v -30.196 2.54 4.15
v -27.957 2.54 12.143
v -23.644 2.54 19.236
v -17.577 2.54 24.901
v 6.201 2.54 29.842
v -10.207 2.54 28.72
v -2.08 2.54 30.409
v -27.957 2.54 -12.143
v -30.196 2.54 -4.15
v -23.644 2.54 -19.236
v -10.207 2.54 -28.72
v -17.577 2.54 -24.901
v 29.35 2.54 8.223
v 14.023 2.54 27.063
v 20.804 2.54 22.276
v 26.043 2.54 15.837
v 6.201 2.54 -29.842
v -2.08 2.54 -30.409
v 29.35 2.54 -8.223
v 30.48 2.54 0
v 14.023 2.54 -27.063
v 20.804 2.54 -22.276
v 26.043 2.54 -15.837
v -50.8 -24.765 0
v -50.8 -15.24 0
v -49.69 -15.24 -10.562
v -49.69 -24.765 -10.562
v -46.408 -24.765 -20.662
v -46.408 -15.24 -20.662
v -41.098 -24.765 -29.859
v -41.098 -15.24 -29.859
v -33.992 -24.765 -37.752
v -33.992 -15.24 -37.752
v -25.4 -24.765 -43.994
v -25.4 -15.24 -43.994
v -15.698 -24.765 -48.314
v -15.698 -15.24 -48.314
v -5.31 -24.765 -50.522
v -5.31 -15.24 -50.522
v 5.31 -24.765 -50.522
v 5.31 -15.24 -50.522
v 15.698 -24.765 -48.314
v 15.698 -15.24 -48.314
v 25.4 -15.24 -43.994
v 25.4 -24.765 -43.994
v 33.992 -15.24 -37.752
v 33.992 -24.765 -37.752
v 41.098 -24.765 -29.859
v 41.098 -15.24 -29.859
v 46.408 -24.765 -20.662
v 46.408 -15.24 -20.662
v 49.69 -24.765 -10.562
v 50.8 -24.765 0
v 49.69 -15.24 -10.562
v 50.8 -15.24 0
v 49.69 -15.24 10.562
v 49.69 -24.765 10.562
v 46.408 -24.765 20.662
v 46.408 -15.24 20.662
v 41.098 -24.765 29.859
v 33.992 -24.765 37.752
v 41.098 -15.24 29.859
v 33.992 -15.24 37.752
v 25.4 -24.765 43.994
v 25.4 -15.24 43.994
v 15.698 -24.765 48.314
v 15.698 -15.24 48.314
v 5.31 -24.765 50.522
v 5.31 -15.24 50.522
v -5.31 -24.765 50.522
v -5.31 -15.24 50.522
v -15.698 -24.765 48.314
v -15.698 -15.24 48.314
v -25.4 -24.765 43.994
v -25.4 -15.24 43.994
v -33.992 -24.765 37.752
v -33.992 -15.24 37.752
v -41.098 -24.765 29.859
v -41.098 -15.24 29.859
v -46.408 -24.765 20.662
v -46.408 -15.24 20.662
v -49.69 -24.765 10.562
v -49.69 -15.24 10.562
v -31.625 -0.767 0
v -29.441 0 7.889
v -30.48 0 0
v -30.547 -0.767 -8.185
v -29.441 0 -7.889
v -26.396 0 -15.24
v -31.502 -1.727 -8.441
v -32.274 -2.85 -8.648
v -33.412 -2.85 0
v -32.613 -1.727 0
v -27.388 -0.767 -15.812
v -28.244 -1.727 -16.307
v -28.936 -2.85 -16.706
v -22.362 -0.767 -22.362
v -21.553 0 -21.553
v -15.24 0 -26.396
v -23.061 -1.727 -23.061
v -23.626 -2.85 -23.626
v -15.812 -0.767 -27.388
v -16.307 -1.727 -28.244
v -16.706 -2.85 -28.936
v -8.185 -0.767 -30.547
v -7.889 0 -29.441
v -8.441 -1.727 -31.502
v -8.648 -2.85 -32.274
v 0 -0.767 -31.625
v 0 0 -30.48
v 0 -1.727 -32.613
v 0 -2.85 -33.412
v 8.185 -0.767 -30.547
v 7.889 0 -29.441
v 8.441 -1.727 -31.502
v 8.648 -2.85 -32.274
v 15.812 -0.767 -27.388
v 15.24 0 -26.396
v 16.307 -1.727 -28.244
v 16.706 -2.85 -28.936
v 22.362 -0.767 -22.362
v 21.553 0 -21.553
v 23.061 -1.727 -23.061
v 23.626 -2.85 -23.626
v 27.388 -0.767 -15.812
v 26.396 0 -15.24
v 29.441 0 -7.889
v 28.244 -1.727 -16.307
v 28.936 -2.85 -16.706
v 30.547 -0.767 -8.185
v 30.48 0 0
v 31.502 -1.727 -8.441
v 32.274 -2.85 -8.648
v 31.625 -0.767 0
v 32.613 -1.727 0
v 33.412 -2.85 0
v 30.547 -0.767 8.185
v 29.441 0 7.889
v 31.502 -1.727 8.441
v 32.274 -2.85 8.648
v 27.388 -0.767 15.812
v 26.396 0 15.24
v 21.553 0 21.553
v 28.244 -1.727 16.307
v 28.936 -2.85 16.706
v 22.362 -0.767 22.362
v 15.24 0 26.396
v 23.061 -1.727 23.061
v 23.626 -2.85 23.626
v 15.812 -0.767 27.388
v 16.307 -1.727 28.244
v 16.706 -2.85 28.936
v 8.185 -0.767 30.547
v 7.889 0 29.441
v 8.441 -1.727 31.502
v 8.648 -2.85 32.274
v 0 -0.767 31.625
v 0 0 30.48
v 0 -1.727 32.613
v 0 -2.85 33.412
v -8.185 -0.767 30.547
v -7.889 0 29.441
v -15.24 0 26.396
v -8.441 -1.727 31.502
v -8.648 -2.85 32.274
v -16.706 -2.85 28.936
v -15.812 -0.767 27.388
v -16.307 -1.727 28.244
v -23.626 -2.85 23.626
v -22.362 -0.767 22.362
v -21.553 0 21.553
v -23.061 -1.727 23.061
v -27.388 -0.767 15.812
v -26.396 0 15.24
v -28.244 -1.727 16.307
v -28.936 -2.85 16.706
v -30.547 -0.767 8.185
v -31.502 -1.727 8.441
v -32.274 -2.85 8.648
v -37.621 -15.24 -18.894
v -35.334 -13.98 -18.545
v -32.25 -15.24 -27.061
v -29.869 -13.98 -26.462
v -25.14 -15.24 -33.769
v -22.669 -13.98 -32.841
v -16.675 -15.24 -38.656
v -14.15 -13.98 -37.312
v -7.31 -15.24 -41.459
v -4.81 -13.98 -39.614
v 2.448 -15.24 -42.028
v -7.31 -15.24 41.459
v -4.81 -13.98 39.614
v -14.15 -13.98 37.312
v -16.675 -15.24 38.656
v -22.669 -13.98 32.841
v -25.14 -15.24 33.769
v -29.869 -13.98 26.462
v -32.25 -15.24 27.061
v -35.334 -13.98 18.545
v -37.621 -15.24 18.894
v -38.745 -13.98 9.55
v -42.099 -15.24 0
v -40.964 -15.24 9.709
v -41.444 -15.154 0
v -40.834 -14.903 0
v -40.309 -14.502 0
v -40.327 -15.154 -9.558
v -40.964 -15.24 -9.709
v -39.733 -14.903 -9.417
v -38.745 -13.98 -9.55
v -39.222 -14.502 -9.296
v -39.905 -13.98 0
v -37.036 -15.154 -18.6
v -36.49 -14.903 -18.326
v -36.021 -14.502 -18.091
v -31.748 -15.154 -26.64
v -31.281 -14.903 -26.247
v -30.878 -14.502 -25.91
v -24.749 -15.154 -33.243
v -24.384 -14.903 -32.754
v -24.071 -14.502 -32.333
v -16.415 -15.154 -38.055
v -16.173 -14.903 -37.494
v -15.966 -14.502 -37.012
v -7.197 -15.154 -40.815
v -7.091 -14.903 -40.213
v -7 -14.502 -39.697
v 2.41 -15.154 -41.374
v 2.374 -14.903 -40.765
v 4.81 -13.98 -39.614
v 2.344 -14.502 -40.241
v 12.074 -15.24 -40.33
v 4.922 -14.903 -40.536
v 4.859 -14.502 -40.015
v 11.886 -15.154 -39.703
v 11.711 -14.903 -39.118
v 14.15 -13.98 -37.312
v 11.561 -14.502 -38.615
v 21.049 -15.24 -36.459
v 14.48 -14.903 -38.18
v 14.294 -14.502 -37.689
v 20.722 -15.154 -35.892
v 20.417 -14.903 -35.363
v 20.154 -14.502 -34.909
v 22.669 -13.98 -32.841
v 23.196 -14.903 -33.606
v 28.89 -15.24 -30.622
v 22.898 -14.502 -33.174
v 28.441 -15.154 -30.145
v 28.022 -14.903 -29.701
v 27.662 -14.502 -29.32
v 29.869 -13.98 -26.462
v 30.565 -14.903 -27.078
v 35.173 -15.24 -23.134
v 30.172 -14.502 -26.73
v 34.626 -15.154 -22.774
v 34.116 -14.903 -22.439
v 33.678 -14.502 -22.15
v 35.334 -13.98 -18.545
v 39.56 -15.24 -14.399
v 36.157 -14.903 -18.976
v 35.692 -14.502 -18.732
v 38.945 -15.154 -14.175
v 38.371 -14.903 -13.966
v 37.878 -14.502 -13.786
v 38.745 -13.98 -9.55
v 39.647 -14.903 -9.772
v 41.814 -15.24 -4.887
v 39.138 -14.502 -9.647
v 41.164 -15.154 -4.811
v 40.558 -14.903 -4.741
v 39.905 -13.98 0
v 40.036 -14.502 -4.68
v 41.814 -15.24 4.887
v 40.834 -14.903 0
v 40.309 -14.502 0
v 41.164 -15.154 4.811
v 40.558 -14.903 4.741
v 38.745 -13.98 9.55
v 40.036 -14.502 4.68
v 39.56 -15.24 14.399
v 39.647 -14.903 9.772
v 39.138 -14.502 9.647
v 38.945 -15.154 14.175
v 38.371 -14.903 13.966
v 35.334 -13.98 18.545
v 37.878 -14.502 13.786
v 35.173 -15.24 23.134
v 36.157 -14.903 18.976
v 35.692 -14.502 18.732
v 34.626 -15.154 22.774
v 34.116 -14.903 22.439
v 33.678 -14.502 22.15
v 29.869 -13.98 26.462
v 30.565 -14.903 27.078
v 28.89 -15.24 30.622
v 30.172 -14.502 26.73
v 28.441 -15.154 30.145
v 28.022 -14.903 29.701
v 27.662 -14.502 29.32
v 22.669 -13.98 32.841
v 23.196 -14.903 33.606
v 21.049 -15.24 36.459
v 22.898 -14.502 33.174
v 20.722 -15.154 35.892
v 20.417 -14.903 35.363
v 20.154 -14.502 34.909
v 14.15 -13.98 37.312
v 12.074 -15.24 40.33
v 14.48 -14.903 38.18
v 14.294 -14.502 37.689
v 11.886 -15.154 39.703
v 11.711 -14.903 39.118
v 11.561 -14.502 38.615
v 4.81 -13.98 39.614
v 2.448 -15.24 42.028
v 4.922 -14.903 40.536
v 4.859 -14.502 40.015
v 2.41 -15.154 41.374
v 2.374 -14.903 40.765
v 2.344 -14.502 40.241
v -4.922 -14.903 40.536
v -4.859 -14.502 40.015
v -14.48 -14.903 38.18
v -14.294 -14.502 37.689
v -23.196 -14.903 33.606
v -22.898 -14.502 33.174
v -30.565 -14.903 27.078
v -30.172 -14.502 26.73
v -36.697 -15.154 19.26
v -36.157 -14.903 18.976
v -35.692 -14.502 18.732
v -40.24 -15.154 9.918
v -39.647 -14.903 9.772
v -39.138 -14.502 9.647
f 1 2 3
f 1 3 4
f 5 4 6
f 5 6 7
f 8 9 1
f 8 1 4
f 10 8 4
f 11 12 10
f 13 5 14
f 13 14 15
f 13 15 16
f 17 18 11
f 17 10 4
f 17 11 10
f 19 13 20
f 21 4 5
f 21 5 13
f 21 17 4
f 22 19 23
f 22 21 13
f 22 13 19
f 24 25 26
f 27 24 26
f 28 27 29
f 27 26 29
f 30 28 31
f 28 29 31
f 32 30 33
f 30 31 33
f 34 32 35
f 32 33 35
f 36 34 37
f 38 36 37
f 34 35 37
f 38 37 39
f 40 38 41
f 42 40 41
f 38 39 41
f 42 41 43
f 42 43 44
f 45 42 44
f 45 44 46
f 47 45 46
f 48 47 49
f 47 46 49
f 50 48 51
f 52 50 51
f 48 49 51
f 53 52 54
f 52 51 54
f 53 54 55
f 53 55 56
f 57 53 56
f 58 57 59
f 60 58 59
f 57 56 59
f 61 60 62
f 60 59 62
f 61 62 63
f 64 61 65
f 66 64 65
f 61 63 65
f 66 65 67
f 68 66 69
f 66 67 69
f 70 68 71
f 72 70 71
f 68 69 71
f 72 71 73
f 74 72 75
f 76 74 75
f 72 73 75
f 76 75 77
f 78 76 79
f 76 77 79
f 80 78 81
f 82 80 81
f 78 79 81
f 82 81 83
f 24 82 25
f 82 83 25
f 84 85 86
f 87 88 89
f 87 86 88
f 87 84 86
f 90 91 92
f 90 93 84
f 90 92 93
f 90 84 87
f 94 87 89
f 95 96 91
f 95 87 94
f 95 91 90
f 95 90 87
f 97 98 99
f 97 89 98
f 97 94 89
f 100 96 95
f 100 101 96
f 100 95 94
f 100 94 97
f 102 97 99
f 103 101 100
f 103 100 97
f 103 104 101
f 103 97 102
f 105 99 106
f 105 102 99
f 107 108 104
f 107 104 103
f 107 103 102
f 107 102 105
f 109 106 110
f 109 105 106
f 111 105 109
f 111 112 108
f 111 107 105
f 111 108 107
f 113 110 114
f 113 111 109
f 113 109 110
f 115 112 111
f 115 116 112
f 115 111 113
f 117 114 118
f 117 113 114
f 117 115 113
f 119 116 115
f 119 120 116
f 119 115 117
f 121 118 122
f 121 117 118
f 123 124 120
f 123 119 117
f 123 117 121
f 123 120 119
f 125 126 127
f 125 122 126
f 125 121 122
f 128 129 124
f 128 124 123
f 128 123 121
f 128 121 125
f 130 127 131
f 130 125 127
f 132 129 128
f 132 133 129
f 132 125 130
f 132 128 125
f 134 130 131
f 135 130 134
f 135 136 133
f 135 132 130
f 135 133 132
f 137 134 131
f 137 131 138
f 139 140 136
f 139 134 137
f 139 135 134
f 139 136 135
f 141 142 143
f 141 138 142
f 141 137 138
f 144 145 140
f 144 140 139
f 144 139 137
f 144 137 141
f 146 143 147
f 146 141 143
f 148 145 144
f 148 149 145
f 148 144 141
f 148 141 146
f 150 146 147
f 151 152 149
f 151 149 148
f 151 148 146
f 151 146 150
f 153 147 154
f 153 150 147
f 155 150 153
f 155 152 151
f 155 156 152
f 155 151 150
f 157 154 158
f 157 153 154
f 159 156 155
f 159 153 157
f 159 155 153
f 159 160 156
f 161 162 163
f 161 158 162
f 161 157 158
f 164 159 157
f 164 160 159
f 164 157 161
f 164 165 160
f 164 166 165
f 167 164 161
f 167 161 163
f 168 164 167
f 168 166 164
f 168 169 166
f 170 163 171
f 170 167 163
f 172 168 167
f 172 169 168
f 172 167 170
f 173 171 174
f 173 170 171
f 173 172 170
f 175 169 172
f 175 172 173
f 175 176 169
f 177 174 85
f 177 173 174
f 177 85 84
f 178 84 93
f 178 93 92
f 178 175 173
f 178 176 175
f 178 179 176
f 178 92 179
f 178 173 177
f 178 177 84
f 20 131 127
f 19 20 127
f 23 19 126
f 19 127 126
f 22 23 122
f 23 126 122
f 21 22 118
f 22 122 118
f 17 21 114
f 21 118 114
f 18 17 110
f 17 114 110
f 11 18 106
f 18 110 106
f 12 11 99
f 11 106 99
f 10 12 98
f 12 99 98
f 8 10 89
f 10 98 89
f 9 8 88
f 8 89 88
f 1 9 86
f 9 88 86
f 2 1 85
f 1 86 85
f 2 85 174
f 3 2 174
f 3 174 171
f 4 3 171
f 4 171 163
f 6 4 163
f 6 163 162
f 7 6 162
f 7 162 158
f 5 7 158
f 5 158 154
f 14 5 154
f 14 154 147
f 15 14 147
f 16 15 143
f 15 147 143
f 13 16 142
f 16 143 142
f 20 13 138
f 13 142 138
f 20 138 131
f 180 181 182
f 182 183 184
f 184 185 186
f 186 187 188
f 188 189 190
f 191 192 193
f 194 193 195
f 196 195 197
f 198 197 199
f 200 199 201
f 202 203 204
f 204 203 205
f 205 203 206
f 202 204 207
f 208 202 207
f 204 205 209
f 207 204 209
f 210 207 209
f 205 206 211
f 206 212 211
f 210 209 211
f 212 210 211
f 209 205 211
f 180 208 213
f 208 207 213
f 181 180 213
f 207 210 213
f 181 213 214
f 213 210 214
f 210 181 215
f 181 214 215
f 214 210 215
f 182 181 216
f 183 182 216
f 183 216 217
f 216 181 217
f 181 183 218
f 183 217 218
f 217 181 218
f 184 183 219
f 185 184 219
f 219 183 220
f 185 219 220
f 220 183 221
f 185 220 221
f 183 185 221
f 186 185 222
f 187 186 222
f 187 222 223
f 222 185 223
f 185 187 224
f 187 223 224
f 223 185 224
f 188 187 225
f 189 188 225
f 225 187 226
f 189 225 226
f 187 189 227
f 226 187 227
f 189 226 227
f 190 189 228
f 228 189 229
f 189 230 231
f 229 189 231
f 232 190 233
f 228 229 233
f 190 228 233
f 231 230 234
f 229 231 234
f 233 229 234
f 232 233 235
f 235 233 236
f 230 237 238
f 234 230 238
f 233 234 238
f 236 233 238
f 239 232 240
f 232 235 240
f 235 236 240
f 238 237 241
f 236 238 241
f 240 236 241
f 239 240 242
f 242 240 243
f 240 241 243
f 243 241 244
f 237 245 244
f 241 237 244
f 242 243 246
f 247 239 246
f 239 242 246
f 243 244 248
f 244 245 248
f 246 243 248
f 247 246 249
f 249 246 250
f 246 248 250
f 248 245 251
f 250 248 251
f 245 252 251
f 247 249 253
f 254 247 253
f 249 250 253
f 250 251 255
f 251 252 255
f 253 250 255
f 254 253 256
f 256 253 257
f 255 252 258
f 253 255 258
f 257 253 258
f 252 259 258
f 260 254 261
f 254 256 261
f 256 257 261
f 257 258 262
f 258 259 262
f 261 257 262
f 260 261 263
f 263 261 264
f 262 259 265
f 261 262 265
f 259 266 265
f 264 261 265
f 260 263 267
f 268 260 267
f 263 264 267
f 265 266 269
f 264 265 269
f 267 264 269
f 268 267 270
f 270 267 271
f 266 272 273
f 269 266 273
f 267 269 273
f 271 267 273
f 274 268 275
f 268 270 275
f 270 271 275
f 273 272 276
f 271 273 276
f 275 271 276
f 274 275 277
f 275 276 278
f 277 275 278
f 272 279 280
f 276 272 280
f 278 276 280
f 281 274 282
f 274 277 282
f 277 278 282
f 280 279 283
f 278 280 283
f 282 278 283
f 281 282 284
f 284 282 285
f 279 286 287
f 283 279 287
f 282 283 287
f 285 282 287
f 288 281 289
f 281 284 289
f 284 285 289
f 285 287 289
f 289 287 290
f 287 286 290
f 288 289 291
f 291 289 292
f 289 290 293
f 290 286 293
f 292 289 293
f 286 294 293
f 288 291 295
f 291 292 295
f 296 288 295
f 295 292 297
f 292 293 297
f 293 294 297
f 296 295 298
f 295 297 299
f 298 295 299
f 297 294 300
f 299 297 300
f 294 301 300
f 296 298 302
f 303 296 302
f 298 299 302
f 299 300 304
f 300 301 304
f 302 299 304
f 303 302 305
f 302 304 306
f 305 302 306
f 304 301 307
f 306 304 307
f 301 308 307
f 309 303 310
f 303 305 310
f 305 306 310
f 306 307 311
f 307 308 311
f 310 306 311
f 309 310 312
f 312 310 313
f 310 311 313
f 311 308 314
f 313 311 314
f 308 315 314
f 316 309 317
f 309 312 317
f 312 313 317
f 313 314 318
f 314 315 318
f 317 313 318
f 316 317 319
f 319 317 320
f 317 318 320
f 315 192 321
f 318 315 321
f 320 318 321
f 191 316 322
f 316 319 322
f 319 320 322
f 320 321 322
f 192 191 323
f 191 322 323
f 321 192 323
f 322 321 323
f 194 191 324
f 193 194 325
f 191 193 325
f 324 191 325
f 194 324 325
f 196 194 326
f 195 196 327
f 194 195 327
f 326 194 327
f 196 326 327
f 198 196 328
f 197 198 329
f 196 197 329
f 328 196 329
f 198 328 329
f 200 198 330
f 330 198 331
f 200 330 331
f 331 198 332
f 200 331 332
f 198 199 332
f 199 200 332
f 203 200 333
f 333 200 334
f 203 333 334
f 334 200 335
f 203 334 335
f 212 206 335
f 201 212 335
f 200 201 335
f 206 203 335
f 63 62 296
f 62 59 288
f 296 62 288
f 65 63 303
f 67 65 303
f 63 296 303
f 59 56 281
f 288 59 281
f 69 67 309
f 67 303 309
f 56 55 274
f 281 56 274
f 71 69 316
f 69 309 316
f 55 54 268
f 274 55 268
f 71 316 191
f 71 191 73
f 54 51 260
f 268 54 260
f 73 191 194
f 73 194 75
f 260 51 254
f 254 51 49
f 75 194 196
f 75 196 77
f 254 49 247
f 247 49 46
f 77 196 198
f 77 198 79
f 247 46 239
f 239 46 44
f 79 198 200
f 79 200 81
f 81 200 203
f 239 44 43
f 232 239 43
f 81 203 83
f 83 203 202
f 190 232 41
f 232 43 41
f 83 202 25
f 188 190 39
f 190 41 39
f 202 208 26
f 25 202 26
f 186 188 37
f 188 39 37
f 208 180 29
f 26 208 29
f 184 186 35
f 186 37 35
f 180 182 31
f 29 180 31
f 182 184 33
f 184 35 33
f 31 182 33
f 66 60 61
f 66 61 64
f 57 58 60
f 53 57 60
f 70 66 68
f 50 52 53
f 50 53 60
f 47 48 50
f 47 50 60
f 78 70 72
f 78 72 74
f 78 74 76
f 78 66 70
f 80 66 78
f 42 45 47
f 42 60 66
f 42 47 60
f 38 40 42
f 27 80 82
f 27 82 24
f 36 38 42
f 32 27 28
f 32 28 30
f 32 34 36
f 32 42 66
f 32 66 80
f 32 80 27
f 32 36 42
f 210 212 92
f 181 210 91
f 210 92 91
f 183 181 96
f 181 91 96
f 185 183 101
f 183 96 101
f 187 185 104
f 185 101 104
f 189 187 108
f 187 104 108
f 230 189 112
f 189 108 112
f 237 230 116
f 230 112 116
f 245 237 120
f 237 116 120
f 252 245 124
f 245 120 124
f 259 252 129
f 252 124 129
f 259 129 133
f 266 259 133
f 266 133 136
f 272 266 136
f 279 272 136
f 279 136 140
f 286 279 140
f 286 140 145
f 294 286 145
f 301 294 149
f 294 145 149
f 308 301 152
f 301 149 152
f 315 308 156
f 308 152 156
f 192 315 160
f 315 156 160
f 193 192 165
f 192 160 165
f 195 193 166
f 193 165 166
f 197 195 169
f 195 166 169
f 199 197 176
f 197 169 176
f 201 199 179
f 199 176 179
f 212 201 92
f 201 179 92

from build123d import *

# Parameters (mm, degrees)
SKETCH3_R           = 30.48
BOSS_EXTRUDE1_DEPTH = 2.54
SKETCH6_R           = 50.8
BOSS_EXTRUDE2_DEPTH = 9.525
FILLET2_R           = 2.54
FILLET1_R           = 7.62


with BuildPart() as part:
    # Sketch1 → Revolve1 (revolve)
    with BuildSketch(Plane.XY, mode=Mode.PRIVATE) as revolve1_sk:
        Polygon((0, 0), (0, -15.24), (40.64, -15.24), (31.75, 0), align=None)
    revolve(revolve1_sk.sketch.rotate(Axis((0, 0, 0), (0, -1, 0)), 180), axis=Axis((0, 0, 0), (0, -1, 0)))

    # Sketch3 → Boss-Extrude1 (add)
    with BuildSketch(Plane(origin=(0, 0, 0), x_dir=(1, 0, 0), z_dir=(0, 1, 0))):
        Circle(SKETCH3_R)
    extrude(amount=BOSS_EXTRUDE1_DEPTH)

    # Sketch6 → Boss-Extrude2 (add)
    with BuildSketch(Plane.XZ.offset(15.24)):
        with Locations(Location((0, 0, 0), (0, 0, 180))):
            Circle(SKETCH6_R)
    extrude(amount=BOSS_EXTRUDE2_DEPTH)

    # Fillet2
    fillet2_edges = [part.edges().sort_by_distance(p)[0] for p in [
        (40.64, -15.24, 0),
    ]]
    fillet(fillet2_edges, radius=FILLET2_R)

    # Fillet1
    # the kernel refuses this fillet: 7.62 mm, written as the material it takes off along each edge
    with BuildSketch(Plane(origin=(0, 0, 0), x_dir=(-1, 0, 0), z_dir=(0, 0, 1))) as fillet1_piece_1:
        with BuildLine():
            CenterArc((26.830262481, 6.689081854), FILLET1_R, 298.618033777, 31.125529059)
            Line((30.48, 0), (30.55299475, -0.133781637))
            ThreePointArc((30.55299475, -0.133781637), (31.115, -0.1524), (31.75, -0.1524))
            Line((31.75, -0.1524), (31.881639904, -0.076789944))
            Line((31.881639904, -0.076789944), (33.543897611, 2.772794695))
            Line((33.543897611, 2.772794695), (33.412257706, 2.849584639))
        make_face()
    revolve(axis=Axis((0, 0, 0), (0, -1, 0)), mode=Mode.SUBTRACT)


solid = part.part
